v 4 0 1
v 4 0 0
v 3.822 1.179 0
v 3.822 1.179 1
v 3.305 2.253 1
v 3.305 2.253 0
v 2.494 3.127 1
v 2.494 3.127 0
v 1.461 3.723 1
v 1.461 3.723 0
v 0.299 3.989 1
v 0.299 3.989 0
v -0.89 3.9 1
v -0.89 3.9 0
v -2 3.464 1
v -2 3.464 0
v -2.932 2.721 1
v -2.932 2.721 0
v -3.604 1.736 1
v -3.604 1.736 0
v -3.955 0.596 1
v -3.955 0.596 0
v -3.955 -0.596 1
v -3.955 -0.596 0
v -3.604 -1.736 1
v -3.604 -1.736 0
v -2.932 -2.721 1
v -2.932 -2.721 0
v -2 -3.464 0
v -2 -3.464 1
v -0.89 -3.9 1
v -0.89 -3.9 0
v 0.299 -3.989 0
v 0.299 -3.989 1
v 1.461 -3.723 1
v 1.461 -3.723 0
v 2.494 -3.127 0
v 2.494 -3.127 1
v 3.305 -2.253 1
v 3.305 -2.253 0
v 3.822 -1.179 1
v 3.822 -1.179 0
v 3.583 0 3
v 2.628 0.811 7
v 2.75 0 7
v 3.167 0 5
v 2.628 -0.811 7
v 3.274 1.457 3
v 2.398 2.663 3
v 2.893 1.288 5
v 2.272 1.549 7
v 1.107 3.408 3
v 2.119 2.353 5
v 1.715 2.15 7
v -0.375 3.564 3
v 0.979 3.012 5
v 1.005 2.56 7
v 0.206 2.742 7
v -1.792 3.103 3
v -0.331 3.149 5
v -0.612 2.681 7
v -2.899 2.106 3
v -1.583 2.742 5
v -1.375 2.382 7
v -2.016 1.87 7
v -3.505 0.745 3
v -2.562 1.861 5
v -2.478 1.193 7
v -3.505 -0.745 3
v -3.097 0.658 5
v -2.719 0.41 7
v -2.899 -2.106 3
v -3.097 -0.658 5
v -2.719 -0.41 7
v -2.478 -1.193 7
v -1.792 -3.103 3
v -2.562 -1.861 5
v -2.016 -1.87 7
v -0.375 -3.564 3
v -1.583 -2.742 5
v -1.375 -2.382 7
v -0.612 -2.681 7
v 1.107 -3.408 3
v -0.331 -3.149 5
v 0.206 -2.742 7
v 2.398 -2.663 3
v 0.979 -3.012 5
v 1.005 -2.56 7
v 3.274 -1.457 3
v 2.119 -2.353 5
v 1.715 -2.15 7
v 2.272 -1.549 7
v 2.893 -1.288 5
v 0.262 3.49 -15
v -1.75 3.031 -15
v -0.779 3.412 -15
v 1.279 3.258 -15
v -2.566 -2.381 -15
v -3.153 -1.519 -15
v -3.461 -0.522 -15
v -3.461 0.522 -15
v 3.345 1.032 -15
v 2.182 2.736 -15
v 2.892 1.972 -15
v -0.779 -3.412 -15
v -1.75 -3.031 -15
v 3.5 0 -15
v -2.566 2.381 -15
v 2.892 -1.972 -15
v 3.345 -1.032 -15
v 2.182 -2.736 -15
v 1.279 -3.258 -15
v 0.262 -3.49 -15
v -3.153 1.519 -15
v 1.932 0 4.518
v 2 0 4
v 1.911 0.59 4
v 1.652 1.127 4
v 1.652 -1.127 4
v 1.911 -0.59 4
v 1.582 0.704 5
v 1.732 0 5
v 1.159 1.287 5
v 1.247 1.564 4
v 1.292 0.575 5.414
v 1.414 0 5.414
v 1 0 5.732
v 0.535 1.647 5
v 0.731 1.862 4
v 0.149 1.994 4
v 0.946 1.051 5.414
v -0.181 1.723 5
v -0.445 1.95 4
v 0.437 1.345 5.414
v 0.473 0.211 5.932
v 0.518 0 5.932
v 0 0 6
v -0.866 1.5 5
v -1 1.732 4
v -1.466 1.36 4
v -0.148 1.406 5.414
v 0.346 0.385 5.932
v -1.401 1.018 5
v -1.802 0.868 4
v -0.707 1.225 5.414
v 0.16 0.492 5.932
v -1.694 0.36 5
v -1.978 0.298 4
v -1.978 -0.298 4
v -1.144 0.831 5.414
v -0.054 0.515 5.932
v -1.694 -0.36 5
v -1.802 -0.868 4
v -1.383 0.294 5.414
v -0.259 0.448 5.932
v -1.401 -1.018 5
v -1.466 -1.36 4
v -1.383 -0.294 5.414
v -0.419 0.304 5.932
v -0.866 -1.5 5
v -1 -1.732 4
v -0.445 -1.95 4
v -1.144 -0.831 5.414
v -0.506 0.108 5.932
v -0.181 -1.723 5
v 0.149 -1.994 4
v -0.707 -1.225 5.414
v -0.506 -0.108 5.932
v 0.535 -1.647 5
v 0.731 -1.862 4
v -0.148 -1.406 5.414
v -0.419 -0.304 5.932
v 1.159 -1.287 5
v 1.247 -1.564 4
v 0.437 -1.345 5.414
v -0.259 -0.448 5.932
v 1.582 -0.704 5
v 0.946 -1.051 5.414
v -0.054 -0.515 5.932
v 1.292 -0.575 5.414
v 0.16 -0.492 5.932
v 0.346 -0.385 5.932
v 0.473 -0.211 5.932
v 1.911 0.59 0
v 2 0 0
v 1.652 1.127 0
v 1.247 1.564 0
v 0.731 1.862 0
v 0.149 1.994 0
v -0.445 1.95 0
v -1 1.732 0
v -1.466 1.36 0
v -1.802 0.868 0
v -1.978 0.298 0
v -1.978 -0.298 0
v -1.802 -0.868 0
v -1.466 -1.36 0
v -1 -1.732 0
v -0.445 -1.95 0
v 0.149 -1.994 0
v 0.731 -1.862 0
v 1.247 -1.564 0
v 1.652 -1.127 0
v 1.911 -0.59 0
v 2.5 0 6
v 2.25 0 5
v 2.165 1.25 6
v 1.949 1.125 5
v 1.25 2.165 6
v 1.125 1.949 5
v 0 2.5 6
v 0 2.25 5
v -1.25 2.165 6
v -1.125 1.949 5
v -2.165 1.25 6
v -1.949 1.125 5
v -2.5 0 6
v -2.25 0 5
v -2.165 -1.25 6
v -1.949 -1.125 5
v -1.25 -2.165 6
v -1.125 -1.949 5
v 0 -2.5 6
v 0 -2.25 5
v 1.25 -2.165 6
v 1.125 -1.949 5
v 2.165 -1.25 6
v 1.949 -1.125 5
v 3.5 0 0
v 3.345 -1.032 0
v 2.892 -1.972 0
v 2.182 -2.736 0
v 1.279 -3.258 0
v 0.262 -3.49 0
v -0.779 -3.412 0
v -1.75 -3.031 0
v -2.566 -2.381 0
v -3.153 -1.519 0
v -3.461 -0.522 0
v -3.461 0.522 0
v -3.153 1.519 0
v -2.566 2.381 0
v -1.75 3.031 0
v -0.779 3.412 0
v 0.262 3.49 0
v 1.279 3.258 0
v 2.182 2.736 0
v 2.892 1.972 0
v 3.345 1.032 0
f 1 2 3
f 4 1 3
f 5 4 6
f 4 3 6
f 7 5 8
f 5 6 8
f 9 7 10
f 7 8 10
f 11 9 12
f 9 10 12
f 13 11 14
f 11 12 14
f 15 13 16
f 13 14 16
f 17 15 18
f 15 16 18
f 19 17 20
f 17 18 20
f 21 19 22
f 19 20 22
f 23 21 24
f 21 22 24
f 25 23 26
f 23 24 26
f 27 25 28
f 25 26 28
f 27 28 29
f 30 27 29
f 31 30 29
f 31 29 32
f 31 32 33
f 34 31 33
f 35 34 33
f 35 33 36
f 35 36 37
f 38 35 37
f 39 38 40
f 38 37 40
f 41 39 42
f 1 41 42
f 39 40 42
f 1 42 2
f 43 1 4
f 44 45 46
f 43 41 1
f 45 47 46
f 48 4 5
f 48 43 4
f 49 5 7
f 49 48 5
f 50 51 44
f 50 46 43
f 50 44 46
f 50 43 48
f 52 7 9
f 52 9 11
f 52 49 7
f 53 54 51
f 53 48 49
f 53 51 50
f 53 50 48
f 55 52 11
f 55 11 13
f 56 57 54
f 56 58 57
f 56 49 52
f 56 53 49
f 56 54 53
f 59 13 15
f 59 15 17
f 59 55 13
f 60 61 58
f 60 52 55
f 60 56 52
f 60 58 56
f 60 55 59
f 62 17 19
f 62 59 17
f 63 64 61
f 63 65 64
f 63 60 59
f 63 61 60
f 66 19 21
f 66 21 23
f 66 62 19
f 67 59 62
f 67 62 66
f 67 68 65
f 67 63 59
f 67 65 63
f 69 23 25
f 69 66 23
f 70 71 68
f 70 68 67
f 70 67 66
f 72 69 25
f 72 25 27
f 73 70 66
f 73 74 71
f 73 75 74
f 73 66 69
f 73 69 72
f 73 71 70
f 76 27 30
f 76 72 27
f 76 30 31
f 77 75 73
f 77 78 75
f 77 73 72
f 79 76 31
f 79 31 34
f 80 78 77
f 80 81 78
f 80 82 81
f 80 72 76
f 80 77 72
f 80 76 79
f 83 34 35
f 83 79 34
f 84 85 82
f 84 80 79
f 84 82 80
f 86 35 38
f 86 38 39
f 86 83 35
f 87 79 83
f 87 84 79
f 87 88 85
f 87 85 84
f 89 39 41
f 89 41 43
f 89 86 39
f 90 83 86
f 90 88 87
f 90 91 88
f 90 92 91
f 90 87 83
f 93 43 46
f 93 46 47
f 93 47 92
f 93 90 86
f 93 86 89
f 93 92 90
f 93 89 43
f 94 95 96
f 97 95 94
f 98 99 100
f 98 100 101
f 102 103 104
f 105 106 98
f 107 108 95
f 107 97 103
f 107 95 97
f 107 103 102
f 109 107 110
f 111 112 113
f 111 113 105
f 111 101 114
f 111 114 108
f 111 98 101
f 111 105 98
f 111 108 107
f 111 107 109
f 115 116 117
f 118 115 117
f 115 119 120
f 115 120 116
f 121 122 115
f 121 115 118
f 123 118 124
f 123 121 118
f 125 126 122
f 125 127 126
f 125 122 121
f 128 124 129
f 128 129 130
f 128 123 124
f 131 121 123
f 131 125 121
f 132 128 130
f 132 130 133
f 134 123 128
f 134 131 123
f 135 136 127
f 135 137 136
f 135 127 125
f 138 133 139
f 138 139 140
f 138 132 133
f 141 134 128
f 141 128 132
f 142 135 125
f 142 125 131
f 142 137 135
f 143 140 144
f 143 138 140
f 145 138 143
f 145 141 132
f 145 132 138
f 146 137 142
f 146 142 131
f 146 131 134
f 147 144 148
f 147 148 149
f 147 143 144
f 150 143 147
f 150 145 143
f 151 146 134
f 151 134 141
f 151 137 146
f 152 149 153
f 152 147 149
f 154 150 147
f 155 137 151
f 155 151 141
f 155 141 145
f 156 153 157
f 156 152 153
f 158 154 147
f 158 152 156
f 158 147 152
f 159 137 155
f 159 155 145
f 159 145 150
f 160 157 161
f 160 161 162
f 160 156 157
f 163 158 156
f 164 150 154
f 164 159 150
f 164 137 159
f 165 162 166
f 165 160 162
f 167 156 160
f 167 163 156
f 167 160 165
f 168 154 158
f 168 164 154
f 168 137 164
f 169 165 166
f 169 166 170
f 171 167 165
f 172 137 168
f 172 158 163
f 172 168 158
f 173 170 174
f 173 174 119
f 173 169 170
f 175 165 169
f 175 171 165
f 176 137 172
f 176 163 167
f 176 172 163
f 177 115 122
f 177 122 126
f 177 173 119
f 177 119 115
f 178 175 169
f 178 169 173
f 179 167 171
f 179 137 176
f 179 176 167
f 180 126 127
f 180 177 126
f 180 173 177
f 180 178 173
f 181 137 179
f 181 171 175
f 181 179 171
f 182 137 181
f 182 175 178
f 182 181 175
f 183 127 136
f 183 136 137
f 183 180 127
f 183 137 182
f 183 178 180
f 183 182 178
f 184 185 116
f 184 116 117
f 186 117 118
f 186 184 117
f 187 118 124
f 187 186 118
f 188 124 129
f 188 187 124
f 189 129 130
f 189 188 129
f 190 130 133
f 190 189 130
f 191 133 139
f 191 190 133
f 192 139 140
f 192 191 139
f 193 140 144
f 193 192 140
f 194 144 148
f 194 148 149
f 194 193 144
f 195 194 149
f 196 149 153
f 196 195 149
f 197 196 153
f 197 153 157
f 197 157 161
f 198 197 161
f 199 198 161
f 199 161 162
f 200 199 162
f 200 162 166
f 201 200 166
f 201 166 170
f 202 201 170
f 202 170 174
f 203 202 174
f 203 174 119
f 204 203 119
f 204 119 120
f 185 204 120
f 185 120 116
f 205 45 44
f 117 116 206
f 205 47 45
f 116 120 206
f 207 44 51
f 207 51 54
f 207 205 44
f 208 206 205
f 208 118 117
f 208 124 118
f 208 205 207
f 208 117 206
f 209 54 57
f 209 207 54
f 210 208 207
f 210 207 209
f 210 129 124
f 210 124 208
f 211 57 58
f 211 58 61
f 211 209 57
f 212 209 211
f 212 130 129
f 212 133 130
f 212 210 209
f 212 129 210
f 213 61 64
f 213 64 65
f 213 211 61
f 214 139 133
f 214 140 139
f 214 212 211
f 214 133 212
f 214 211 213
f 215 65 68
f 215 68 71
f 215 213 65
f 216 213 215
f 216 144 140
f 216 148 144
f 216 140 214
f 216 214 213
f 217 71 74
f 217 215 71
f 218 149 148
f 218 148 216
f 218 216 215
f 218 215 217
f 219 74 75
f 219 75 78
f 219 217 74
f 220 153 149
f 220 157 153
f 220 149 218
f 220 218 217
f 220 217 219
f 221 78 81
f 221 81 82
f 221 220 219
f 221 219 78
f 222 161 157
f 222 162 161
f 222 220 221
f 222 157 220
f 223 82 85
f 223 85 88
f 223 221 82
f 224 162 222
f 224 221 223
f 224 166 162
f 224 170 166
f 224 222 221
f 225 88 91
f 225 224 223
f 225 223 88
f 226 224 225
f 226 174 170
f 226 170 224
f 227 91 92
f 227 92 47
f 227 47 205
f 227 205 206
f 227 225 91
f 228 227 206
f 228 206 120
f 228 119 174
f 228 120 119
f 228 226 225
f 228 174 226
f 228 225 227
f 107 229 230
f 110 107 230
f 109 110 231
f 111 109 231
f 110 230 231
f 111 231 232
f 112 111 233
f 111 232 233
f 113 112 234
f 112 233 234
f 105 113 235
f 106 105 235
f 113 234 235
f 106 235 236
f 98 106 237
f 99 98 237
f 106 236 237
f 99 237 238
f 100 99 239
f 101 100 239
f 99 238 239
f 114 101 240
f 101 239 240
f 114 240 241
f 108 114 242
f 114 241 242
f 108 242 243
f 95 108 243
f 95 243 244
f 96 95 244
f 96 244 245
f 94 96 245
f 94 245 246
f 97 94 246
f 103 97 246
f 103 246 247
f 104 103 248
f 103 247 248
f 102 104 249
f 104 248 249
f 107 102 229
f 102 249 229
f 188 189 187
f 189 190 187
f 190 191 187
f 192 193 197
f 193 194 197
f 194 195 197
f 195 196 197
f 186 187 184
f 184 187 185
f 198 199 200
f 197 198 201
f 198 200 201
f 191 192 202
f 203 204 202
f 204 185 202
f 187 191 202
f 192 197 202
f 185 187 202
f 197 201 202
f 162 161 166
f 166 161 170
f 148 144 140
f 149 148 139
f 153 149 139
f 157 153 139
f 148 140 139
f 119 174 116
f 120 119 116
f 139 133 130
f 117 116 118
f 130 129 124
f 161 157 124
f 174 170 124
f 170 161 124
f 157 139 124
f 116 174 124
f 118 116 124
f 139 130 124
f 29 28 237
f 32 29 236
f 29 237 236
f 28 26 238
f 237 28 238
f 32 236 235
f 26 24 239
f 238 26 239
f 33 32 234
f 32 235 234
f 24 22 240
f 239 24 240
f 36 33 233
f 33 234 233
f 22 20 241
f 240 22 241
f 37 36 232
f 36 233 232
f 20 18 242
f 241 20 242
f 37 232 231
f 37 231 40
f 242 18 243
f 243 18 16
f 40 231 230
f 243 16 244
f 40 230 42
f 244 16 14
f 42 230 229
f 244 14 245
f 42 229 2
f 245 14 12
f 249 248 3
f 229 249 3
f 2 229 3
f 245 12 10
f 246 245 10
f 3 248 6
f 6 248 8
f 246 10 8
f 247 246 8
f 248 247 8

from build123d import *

# Parameters (mm, degrees)
ESQUISSE1_R        = 4
ESQUISSE1_R_2      = 2
BOSS_EXTRU_1_DEPTH = 7
CHANFREIN1_SIZE    = 6
CHANFREIN1_SIZE2   = 1.25
CHANFREIN2_SIZE    = 0.75
CHANFREIN2_SIZE_2  = 3
ESQUISSE4_R        = 2
BOSS_EXTRU_2_DEPTH = 2
CONG_1_R           = 2
ESQUISSE5_R        = 3.5
BOSS_EXTRU_3_DEPTH = 15


# Some blends are built 0.0001 mm under size
with BuildPart() as part:
    # Esquisse1 → Boss.-Extru.1 (new body)
    with BuildSketch(Plane.XY):
        Circle(ESQUISSE1_R)
        Circle(ESQUISSE1_R_2, mode=Mode.SUBTRACT)
    extrude(amount=BOSS_EXTRU_1_DEPTH)

    # Chanfrein1
    chanfrein1_edges = [part.edges().sort_by_distance(p)[0] for p in [
        (-4, 0, 7),
    ]]
    chanfrein1_side = [part.faces().sort_by_distance(p)[0] for p in [
        (-4, 0, 3.5),
    ]]
    chamfer(chanfrein1_edges, length=CHANFREIN1_SIZE, length2=CHANFREIN1_SIZE2, reference=chanfrein1_side[0])

    # Chanfrein2
    # the kernel refuses this chamfer: 3, 0.75 mm, written as the material it takes off along each edge
    with BuildSketch(Plane(origin=(0, 0, 7), x_dir=(1, 0, 0), z_dir=(0, -1, 0))) as chanfrein2_piece_1:
        Polygon((2 + CHANFREIN2_SIZE, 0), (2, -CHANFREIN2_SIZE_2), (2, 0), align=None)
    revolve(axis=Axis((0, 0, 7), (0, 0, 1)), mode=Mode.SUBTRACT)

    # Esquisse5 → Boss.-Extru.3 (add)
    with BuildSketch(Plane(origin=(0, 0, 0), x_dir=(-1, 0, 0), z_dir=(0, 0, -1))):
        with Locations(Location((0, 0, 0), (0, 0, 180))):
            Circle(ESQUISSE5_R)
    extrude(amount=BOSS_EXTRU_3_DEPTH)


with BuildPart() as body_2:
    # Esquisse4 → Boss.-Extru.2 (new body)
    with BuildSketch(Plane.XY.offset(4)):
        Circle(ESQUISSE4_R)
    extrude(amount=BOSS_EXTRU_2_DEPTH)

    # Congé1
    cong_1_edges = [body_2.edges().sort_by_distance(p)[0] for p in [
        (-2, 0, 6),
    ]]
    fillet(cong_1_edges, radius=CONG_1_R - 0.0001)  # a hair under: the kernel refuses the full size


solid = Compound([part.part, body_2.part])
